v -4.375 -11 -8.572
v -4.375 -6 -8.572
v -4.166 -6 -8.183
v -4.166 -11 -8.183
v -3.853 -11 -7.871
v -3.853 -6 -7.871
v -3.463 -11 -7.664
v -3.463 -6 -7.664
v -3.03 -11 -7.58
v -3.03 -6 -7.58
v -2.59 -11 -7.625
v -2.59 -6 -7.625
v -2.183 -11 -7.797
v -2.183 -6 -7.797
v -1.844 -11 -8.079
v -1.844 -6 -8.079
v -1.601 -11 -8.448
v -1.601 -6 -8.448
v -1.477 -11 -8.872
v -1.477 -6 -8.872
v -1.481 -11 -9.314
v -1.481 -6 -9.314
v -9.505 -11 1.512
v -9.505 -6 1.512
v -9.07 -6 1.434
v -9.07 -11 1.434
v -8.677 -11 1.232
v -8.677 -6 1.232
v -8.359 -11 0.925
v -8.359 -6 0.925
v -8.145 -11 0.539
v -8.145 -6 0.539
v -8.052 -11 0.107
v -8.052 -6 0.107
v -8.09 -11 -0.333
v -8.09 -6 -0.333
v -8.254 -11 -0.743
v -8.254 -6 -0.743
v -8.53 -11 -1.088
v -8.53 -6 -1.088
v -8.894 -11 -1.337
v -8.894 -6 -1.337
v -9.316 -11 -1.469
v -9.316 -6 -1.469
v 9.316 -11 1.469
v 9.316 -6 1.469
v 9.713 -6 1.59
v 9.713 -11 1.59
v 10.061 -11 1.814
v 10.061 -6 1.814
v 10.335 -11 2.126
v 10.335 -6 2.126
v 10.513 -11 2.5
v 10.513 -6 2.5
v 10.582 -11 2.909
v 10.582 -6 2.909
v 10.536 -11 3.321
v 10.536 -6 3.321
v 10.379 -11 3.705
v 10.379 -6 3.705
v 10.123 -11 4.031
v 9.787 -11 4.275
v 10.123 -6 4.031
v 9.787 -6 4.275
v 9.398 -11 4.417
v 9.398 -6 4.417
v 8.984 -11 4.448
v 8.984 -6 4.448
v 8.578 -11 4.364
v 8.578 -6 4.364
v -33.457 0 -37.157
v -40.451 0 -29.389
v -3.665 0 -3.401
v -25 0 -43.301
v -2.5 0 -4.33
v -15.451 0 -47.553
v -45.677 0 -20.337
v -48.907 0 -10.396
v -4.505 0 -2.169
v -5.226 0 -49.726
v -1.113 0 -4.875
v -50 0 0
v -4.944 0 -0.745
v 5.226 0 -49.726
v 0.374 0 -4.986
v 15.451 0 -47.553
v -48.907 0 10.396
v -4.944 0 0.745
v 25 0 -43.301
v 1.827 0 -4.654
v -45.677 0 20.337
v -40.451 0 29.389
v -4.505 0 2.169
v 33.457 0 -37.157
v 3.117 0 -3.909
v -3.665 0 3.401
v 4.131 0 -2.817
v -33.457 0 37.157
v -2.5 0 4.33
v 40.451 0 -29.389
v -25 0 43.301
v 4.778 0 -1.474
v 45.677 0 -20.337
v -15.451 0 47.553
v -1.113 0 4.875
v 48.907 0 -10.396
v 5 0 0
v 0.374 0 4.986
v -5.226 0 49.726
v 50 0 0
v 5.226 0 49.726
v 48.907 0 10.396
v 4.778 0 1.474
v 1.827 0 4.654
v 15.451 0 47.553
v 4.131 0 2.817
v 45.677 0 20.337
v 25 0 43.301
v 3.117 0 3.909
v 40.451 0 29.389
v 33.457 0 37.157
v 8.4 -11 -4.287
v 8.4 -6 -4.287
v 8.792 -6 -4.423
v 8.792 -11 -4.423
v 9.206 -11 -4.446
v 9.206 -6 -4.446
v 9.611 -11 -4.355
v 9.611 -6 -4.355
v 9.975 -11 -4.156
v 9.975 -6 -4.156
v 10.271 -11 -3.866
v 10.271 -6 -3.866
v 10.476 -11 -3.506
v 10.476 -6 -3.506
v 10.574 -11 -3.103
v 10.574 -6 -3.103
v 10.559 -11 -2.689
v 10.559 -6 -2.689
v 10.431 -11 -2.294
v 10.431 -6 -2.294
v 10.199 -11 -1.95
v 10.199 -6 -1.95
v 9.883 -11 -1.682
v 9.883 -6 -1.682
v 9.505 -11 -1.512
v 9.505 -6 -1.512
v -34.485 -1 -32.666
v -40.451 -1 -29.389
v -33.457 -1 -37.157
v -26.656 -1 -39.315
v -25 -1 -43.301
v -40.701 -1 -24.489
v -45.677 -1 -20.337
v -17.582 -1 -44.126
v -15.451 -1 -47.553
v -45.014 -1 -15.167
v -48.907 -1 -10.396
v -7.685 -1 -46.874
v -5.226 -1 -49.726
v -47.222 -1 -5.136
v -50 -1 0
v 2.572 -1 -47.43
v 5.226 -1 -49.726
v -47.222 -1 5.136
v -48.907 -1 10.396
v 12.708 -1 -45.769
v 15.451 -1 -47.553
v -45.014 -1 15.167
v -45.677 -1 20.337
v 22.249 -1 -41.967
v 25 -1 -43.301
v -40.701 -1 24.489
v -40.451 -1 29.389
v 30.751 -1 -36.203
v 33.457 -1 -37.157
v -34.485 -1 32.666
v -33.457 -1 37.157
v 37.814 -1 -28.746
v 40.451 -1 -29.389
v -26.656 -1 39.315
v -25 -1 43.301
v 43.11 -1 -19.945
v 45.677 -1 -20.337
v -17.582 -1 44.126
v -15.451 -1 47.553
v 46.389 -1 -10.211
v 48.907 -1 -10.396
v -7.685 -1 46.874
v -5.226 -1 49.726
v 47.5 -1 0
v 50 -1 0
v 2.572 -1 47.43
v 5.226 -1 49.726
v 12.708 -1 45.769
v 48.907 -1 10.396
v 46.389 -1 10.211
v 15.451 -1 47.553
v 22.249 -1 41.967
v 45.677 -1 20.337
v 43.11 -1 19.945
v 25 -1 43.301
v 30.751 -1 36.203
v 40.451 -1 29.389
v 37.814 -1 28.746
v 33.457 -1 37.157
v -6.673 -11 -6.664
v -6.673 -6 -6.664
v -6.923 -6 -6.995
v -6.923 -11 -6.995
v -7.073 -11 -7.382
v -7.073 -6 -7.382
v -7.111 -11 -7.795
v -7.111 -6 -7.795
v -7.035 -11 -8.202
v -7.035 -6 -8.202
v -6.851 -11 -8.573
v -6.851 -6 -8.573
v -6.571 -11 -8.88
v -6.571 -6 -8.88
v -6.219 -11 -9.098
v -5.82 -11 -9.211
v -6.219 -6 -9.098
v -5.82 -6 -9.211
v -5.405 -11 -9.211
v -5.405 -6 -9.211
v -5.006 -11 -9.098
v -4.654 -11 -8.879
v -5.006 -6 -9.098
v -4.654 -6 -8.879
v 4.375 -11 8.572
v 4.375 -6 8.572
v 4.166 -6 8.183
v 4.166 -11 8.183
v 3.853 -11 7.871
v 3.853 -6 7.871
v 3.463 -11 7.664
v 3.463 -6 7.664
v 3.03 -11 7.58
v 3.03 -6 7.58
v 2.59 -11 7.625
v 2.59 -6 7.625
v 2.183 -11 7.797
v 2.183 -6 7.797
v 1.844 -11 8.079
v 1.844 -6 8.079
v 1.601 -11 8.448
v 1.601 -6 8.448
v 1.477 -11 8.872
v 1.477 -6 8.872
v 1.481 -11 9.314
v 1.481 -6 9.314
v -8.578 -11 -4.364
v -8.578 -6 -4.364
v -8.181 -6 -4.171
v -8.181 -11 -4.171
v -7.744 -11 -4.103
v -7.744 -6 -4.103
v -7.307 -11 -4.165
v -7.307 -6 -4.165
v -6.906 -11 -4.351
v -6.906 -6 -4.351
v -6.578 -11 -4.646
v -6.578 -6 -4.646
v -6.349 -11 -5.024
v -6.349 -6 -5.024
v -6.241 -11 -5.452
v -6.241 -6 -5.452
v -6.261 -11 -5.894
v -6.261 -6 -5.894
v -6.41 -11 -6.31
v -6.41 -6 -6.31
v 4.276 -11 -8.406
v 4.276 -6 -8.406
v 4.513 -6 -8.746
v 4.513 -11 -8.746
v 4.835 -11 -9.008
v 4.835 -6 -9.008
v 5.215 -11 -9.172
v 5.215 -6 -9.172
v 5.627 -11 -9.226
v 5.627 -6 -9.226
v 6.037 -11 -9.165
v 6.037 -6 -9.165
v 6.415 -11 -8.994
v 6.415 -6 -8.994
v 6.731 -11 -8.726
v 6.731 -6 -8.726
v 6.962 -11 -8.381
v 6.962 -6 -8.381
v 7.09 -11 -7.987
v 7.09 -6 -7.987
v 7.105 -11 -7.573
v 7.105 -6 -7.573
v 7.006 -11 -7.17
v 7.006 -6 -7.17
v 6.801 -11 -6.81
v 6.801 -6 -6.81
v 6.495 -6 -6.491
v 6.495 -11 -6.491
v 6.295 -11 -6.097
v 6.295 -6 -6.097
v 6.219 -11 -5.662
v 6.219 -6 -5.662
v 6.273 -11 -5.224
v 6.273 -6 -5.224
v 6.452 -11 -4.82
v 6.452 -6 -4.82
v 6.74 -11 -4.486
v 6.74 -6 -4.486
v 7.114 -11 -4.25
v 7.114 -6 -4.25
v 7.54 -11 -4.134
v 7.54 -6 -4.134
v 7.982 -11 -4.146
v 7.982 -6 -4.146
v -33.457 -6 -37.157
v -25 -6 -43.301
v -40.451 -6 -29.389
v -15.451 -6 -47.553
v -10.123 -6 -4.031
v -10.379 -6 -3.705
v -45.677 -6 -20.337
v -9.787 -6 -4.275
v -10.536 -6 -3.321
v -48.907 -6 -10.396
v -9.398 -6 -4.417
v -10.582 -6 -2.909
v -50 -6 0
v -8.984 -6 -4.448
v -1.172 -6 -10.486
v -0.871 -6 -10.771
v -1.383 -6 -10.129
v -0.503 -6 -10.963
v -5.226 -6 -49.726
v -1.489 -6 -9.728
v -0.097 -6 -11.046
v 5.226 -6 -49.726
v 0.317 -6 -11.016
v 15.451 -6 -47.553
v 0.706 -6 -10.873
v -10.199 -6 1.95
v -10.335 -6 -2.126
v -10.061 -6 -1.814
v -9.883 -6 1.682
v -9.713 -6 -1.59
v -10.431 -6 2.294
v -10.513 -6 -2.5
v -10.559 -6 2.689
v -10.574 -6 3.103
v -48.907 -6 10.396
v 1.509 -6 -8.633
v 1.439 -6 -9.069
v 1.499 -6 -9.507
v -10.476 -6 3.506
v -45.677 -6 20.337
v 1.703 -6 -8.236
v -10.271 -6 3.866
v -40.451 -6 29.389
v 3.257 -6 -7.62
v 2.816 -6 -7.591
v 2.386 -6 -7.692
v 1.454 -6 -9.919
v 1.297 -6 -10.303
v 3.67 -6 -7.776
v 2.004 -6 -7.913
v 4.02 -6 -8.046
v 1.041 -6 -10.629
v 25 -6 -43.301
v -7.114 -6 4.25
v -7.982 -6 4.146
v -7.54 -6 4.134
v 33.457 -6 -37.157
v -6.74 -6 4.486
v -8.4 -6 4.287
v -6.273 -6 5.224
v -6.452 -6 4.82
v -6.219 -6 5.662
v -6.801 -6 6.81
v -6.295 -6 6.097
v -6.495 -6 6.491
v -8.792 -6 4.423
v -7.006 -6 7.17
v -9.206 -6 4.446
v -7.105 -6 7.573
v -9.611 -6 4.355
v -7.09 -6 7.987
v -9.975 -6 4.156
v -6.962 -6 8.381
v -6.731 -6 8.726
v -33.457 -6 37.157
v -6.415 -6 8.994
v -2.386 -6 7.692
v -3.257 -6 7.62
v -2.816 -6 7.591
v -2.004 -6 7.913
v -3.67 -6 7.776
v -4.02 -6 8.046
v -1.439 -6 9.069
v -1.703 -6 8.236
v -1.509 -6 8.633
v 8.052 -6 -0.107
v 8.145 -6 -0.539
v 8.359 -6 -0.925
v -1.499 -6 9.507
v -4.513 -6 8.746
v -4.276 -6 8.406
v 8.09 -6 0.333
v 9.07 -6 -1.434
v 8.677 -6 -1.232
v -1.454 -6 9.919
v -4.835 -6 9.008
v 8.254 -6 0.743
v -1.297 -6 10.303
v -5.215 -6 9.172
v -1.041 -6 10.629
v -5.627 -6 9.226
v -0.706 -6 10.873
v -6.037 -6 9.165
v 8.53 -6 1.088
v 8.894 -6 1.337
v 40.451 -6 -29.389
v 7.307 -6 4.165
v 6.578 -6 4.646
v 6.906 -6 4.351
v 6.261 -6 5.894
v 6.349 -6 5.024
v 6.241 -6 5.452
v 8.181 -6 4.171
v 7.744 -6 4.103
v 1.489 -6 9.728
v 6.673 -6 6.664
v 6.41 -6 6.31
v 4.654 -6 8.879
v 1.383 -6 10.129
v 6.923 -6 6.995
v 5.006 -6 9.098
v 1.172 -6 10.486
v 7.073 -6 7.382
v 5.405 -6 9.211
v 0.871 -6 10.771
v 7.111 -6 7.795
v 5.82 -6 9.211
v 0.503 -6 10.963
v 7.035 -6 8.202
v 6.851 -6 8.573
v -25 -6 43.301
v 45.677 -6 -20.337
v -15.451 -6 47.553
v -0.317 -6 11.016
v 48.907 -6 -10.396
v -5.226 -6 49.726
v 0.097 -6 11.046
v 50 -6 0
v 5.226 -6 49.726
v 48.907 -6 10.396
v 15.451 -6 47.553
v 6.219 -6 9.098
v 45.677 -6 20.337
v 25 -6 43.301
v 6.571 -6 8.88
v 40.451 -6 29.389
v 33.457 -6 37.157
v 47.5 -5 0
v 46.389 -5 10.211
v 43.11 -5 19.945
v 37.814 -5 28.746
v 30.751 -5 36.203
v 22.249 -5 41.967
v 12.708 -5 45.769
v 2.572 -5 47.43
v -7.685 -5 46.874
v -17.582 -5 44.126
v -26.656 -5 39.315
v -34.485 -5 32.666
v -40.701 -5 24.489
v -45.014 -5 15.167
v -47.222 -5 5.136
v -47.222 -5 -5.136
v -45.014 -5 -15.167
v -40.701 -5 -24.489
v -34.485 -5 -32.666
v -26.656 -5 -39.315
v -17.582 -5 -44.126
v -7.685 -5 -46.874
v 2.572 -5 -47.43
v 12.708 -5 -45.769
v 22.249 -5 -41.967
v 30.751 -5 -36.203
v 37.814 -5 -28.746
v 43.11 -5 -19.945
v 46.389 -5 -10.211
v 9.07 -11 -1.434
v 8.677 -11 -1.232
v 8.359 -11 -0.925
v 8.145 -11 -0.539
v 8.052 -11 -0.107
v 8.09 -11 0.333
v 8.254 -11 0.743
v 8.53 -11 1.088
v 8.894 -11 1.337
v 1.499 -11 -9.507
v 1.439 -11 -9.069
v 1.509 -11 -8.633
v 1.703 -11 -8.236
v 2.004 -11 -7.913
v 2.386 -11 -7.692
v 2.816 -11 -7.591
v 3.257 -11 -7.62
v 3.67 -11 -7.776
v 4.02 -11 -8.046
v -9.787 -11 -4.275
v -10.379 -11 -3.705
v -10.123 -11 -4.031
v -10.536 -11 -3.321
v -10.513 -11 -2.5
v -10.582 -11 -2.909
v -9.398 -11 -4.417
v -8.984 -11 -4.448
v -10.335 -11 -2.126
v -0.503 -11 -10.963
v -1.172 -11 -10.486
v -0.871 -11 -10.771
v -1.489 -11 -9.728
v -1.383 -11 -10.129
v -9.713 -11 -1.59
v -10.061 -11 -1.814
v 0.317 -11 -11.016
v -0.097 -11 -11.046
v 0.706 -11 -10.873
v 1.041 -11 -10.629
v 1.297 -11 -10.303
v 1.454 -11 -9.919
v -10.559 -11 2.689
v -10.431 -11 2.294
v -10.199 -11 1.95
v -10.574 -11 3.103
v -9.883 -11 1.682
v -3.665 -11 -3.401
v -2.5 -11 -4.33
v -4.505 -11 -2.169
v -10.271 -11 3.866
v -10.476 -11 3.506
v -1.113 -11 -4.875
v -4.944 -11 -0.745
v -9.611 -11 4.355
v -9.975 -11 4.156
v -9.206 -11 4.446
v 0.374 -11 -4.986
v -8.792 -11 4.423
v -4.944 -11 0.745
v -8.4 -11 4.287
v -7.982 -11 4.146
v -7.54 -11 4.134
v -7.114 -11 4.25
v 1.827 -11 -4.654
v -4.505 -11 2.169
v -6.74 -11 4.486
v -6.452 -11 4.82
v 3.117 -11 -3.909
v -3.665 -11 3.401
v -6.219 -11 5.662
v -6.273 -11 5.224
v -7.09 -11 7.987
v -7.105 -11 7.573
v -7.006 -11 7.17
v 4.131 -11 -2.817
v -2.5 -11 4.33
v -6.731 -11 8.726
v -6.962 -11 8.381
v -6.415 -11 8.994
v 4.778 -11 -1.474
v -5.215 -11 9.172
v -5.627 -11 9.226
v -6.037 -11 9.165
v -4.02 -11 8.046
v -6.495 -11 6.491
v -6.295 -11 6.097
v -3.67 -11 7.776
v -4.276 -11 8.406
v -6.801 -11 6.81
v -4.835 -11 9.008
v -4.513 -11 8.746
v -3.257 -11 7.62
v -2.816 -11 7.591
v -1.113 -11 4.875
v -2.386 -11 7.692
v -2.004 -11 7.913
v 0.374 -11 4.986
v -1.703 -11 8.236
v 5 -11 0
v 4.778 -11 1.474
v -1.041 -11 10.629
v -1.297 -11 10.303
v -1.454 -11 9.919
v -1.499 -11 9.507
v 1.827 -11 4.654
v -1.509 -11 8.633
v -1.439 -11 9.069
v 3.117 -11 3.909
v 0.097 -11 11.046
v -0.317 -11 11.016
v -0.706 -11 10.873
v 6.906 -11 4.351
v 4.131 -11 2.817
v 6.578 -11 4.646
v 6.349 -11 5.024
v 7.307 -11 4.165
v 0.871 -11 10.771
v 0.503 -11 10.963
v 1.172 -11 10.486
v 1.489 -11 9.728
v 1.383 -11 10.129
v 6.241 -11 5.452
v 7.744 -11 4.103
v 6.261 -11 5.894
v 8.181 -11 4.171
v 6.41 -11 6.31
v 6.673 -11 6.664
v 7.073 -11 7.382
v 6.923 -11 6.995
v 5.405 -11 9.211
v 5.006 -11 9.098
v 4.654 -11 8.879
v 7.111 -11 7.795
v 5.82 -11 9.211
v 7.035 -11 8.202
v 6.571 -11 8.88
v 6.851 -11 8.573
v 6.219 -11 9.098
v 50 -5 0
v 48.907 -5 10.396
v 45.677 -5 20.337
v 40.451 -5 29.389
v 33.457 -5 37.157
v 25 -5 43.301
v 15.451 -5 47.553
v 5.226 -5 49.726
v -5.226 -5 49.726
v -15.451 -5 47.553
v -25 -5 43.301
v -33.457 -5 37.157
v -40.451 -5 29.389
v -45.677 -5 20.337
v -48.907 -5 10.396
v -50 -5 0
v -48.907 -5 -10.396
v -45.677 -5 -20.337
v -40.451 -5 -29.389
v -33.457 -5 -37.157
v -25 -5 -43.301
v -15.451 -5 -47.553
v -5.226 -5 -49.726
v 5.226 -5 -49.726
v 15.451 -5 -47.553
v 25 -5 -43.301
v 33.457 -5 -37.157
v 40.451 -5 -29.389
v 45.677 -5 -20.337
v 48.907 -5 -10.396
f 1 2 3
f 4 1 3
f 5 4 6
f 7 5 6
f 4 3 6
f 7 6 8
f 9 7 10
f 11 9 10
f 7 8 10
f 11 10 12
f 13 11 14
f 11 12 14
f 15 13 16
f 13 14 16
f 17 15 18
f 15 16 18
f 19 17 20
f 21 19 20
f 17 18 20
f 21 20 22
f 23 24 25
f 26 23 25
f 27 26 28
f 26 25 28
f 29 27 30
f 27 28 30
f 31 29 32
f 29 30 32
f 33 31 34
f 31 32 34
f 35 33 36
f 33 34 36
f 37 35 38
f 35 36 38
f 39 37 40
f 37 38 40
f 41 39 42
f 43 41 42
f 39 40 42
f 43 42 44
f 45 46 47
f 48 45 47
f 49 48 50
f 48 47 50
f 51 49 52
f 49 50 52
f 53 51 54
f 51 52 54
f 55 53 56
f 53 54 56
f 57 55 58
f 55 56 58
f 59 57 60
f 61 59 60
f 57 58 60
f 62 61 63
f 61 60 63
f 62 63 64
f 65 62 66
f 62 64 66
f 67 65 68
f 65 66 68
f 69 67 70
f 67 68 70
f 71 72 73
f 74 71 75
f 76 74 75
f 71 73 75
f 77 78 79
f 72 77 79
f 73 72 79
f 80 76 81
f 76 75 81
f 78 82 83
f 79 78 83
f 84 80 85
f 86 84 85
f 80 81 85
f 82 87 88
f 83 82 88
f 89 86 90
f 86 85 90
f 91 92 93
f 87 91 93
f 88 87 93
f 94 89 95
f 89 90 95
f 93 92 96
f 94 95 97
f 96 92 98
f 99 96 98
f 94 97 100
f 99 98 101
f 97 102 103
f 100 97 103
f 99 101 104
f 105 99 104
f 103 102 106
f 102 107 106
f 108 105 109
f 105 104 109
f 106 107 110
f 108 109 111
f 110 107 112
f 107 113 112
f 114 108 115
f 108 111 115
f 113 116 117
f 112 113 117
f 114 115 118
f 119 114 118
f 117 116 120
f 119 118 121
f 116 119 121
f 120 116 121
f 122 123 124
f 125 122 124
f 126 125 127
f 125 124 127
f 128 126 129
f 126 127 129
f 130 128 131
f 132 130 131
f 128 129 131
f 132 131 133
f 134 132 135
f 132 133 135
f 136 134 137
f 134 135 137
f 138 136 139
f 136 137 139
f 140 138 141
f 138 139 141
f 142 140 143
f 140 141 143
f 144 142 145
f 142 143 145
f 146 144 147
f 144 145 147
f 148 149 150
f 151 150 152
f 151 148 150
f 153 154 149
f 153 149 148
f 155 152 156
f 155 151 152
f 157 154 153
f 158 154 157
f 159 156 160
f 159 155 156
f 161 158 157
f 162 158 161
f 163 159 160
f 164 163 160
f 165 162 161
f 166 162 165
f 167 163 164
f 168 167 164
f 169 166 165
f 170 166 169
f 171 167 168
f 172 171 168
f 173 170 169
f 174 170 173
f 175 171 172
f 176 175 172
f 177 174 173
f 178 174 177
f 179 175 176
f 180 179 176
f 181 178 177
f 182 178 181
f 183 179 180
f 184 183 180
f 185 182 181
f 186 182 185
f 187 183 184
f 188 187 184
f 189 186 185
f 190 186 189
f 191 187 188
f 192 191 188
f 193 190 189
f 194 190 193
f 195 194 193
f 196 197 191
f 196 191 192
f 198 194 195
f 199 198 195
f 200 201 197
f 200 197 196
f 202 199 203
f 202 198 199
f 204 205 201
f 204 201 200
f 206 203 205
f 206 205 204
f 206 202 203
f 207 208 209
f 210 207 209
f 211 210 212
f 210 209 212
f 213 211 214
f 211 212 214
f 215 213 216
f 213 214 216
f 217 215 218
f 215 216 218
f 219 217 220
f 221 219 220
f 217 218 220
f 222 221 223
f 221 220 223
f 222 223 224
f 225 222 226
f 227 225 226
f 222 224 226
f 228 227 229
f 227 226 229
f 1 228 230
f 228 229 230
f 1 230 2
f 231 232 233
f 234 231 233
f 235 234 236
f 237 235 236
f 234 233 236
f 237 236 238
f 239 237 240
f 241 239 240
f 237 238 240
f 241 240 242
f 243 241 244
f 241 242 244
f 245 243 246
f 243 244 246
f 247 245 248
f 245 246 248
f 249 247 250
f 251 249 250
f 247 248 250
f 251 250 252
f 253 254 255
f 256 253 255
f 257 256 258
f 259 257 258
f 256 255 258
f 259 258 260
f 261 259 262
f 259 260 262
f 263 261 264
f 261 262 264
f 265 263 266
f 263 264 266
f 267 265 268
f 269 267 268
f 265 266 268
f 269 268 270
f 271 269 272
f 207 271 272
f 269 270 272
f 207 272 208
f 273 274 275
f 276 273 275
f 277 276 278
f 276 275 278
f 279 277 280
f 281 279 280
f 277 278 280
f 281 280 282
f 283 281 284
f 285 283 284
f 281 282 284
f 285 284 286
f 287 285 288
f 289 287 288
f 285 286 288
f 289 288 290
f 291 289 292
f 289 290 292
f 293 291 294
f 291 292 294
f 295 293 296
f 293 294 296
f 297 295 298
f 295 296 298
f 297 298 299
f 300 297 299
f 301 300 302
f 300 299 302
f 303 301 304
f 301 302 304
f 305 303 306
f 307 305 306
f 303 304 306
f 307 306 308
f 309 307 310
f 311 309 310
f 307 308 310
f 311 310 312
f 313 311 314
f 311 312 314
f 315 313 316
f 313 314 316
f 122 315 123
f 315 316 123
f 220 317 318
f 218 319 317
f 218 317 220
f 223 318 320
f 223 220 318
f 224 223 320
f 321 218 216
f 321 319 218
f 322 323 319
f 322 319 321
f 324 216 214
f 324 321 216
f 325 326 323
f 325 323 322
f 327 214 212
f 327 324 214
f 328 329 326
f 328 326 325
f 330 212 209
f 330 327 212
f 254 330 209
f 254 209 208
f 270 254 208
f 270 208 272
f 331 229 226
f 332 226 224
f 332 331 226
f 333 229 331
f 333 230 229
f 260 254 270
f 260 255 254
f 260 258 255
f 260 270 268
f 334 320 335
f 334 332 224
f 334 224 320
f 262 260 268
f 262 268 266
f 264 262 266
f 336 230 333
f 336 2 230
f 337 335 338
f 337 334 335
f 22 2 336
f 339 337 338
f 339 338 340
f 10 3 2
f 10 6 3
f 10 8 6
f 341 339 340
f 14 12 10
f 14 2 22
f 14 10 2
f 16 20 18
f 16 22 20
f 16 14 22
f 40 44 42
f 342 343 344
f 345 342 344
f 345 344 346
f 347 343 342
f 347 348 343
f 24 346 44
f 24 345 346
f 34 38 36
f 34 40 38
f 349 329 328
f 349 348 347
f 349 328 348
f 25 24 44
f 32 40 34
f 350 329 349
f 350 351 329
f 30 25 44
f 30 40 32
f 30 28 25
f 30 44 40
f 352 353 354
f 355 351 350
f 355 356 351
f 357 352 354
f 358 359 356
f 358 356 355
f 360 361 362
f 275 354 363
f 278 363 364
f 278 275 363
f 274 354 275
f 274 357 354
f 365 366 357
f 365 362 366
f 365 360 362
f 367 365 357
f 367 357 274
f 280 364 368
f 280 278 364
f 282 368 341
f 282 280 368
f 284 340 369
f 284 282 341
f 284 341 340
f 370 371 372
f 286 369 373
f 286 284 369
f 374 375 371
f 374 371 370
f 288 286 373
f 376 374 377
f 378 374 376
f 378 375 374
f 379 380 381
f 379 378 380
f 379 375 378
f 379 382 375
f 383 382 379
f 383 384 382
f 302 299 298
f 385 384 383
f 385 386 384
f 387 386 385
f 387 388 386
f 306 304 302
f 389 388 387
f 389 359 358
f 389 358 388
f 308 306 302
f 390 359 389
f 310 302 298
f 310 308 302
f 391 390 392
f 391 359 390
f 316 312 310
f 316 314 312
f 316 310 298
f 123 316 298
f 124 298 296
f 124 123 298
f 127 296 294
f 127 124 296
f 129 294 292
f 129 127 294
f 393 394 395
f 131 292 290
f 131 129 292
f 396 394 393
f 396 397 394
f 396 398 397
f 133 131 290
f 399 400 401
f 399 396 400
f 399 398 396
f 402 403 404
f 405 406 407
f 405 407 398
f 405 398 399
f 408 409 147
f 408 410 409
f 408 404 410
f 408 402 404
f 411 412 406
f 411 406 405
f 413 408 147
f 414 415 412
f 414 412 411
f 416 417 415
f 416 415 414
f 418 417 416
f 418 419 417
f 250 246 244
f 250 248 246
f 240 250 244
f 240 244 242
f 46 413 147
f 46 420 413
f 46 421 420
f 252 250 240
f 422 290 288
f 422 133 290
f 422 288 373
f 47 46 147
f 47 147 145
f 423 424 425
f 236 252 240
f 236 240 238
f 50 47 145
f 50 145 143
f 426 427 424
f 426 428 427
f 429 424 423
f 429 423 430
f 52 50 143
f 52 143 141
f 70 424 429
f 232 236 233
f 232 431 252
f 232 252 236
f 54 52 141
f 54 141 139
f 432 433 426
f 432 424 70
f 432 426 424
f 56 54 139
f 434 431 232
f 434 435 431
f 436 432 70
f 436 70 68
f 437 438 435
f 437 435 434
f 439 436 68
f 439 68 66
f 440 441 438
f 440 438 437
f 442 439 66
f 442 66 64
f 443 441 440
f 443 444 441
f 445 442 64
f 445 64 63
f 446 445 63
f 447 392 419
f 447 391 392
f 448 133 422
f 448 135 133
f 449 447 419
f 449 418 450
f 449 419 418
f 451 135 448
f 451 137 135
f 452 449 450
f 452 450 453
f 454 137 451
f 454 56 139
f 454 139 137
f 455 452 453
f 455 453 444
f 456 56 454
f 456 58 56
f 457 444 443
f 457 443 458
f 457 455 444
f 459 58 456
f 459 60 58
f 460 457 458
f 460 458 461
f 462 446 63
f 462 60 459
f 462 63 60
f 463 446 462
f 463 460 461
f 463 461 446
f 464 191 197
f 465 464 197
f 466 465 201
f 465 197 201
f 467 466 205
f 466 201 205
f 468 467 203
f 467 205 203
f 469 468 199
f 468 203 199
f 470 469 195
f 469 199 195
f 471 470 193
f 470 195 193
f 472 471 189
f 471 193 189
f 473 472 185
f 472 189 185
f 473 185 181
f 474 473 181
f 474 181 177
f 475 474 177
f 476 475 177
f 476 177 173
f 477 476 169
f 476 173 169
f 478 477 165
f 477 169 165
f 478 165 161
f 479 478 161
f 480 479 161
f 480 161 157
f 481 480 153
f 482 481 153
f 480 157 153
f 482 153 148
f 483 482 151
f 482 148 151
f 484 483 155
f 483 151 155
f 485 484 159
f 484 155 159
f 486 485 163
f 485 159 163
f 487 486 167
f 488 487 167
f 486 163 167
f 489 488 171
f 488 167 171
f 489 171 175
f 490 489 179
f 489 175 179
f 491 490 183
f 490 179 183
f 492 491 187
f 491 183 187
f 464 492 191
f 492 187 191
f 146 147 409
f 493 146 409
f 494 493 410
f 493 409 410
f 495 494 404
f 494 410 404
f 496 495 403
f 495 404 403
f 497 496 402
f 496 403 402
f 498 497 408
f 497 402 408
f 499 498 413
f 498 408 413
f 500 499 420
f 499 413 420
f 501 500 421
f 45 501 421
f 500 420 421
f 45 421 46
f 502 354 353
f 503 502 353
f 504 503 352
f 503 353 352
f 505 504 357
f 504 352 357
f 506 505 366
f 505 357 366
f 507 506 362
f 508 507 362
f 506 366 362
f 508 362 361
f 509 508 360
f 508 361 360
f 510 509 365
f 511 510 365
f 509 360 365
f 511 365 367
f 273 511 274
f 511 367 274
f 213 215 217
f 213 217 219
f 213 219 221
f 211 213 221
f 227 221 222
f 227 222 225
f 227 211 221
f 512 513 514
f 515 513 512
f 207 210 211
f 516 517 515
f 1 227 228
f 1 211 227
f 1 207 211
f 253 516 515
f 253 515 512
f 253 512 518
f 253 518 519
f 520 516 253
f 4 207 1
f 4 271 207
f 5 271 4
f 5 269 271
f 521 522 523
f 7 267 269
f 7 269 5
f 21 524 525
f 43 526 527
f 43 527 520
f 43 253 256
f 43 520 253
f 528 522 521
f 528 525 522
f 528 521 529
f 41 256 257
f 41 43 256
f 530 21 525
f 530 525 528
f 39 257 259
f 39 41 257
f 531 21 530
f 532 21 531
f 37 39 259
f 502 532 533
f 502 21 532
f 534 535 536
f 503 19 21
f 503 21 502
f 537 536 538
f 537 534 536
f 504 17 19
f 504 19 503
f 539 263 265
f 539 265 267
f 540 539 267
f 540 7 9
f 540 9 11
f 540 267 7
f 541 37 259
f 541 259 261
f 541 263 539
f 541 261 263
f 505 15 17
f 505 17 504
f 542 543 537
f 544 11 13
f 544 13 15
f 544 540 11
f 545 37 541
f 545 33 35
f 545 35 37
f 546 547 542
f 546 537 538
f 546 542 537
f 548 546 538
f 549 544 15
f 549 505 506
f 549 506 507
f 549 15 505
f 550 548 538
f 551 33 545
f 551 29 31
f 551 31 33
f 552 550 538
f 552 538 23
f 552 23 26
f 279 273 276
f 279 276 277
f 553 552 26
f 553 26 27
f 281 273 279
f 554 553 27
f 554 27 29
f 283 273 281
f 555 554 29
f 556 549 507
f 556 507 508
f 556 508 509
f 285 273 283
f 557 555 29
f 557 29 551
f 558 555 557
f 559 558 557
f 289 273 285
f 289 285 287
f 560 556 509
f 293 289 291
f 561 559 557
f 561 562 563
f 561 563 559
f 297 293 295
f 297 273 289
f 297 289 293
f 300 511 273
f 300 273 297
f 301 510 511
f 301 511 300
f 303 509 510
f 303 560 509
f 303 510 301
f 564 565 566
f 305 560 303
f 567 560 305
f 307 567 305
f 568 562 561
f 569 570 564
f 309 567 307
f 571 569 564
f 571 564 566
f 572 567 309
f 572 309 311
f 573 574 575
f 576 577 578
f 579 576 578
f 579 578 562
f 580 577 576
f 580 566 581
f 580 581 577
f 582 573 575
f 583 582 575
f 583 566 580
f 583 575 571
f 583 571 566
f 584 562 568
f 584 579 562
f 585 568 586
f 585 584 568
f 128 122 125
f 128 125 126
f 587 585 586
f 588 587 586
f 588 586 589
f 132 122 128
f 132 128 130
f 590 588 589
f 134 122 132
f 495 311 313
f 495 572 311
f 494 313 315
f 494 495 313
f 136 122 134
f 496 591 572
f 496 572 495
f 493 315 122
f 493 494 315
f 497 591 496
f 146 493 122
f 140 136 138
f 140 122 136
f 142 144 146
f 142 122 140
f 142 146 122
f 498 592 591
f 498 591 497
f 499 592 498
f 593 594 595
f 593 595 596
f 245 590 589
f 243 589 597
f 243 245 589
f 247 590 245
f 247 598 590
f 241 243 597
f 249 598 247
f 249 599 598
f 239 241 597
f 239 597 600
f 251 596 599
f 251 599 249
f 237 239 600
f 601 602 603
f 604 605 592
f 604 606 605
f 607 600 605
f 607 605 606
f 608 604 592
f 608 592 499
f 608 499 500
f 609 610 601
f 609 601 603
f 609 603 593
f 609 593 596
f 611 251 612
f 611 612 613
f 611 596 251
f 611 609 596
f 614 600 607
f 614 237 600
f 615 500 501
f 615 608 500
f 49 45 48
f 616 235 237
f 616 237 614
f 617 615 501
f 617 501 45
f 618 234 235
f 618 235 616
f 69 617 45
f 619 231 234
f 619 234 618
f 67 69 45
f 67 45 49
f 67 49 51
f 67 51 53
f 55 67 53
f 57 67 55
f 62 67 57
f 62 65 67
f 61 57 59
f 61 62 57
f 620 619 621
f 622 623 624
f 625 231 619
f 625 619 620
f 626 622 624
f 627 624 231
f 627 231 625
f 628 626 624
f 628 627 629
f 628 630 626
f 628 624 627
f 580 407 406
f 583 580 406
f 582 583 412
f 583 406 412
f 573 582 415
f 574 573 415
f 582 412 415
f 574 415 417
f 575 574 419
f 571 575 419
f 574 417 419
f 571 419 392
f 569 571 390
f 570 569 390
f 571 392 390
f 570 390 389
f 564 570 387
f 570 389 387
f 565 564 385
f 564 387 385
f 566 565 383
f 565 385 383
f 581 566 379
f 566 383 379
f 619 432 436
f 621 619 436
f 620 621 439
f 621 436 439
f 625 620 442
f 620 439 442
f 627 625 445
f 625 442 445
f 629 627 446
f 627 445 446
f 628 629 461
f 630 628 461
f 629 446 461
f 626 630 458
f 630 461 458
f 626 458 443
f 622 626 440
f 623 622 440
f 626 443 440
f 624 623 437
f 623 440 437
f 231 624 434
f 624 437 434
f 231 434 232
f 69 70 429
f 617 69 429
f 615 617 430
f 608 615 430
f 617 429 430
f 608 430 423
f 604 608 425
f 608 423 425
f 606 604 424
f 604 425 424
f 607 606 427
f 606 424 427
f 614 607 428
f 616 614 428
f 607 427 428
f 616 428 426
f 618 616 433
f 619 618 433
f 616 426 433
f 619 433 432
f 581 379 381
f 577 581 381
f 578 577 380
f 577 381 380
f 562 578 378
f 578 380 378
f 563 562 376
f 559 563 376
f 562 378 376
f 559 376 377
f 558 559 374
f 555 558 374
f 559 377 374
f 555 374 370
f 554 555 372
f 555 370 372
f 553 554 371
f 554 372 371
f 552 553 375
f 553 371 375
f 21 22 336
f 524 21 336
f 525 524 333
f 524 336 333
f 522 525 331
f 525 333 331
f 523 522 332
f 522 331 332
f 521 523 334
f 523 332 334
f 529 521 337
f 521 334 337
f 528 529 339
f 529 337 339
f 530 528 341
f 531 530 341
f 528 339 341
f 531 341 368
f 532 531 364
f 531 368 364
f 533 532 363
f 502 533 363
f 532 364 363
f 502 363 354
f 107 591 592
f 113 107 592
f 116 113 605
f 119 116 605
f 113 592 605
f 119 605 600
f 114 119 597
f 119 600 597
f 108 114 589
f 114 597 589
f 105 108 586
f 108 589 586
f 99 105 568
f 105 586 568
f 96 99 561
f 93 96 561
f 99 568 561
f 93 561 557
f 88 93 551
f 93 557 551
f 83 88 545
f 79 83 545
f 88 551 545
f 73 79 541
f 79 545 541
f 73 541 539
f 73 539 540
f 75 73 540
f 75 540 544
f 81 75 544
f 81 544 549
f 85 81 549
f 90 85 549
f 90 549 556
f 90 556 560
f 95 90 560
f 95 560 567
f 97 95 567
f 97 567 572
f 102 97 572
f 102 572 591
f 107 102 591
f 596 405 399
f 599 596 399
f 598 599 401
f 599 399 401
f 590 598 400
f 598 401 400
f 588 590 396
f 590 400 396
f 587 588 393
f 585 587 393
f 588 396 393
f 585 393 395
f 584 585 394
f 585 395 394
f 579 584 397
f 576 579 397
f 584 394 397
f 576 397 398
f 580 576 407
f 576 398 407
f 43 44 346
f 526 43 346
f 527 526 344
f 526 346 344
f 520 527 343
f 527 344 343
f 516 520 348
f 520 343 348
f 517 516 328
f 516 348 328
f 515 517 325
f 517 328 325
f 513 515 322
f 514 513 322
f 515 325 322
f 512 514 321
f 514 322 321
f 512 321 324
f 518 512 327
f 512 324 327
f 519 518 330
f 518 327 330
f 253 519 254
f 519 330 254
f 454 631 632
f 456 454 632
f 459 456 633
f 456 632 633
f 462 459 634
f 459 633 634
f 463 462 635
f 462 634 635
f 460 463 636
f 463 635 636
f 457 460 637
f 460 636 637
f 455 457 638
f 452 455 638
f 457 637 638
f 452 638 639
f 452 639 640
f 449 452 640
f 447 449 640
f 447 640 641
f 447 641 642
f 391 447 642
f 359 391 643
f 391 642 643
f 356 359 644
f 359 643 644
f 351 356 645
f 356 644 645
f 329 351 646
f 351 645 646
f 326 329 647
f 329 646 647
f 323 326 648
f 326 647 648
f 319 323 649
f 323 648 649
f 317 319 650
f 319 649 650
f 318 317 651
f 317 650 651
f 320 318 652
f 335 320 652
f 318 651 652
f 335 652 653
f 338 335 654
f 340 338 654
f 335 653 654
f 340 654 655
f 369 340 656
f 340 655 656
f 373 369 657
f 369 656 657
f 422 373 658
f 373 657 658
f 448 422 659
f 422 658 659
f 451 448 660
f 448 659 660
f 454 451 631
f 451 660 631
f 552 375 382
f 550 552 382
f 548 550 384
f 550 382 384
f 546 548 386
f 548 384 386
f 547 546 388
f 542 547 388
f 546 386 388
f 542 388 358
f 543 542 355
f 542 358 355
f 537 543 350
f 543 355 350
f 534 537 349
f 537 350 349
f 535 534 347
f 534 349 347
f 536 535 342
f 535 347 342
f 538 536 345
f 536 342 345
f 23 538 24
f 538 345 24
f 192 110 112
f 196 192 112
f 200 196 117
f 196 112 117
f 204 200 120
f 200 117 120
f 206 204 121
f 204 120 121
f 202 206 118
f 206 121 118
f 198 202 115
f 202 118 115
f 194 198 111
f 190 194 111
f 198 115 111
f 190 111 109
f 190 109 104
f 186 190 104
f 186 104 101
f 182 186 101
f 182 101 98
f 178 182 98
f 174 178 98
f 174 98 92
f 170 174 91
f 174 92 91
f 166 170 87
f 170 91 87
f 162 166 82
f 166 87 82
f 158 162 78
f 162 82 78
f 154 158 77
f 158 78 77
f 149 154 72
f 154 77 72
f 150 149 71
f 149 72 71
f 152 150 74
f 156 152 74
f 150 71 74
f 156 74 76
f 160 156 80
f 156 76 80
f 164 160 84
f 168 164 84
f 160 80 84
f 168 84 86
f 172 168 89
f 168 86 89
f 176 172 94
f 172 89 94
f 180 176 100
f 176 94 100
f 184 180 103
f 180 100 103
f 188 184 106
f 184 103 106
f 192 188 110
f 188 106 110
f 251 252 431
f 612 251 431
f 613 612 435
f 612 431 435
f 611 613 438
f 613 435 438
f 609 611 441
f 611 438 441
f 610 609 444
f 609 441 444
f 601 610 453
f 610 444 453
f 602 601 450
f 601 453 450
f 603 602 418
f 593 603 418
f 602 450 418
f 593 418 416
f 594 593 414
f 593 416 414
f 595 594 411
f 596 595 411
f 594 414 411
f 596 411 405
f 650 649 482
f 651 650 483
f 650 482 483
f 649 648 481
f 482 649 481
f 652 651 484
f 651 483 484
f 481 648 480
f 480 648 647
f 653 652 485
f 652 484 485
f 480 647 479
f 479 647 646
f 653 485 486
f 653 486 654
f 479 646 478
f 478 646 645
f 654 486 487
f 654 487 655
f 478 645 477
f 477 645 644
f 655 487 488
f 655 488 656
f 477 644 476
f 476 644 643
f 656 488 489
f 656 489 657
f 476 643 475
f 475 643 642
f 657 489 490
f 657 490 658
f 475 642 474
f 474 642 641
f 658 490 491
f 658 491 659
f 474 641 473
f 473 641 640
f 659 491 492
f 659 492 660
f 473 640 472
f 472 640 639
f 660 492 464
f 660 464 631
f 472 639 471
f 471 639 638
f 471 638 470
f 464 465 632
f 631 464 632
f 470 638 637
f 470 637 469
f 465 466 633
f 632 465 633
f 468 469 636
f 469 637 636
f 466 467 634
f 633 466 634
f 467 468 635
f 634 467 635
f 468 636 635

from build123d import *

# Parameters (mm, degrees)
F0_R      = 50
F1_DEPTH  = 1
F2_R      = 47.5
F3_DEPTH  = 4
F4_R      = 50
F4_R_2    = 47.5
F5_DEPTH  = 1
F7_DEPTH  = 6
F8_DEPTH  = 1
F9_R      = 5
F10_DEPTH = 25


with BuildPart() as f1:
    # F0 (on Front) → F1 (new body)
    with BuildSketch(Plane.XZ):
        Circle(F0_R)
    extrude(amount=F1_DEPTH)

    # F2 (on face) → F3 (join)
    with BuildSketch(Plane.XZ.offset(1)):
        Circle(F2_R)
    extrude(amount=F3_DEPTH)

    # F4 (on face) → F5 (join)
    with BuildSketch(Plane.XZ.offset(5)):
        Circle(F4_R)
        Circle(F4_R_2, mode=Mode.SUBTRACT)
    extrude(amount=F5_DEPTH)

    # F6 (on face) → F7 (join)
    with BuildSketch(Plane.XZ.offset(5)):
        with BuildLine():
            ThreePointArc((4.3749025625, 8.5724532519), (2.590430401, 7.6252153584), (1.4813797084, 9.3138855699))
            ThreePointArc((1.4813797084, 9.3138855699), (0.0968585728, 11.046369539), (-1.4993910756, 9.5067635707))
            ThreePointArc((-1.4993910756, 9.5067635707), (-2.3862869161, 7.6915455975), (-4.2761032204, 8.4058248554))
            ThreePointArc((-4.2761032204, 8.4058248554), (-6.4145328749, 8.9936327239), (-6.8009682853, 6.8098133285))
            ThreePointArc((-6.8009682853, 6.8098133285), (-6.4515237381, 4.8199668444), (-8.4002600583, 4.2870247495))
            ThreePointArc((-8.4002600583, 4.2870247495), (-10.4757907864, 3.5056338906), (-9.5048067664, 1.5117458519))
            ThreePointArc((-9.5048067664, 1.5117458519), (-8.0524977714, 0.1073245813), (-9.3158030683, -1.4692731))
            ThreePointArc((-9.3158030683, -1.4692731), (-10.5356526766, -3.3213979368), (-8.5781321192, -4.3637571578))
            ThreePointArc((-8.5781321192, -4.3637571578), (-6.5776913503, -4.6463120239), (-6.6730259387, -6.6643585641))
            ThreePointArc((-6.6730259387, -6.6643585641), (-6.5712533379, -8.8797686425), (-4.3749025625, -8.5724532519))
            ThreePointArc((-4.3749025625, -8.5724532519), (-2.590430401, -7.6252153584), (-1.4813797084, -9.3138855699))
            ThreePointArc((-1.4813797084, -9.3138855699), (-0.0968585728, -11.046369539), (1.4993910756, -9.5067635707))
            ThreePointArc((1.4993910756, -9.5067635707), (2.3862869161, -7.6915455975), (4.2761032204, -8.4058248554))
            ThreePointArc((4.2761032204, -8.4058248554), (6.4145328749, -8.9936327239), (6.8009682853, -6.8098133285))
            ThreePointArc((6.8009682853, -6.8098133285), (6.4515237381, -4.8199668444), (8.4002600583, -4.2870247495))
            ThreePointArc((8.4002600583, -4.2870247495), (10.4757907864, -3.5056338906), (9.5048067664, -1.5117458519))
            ThreePointArc((9.5048067664, -1.5117458519), (8.0524977714, -0.1073245813), (9.3158030683, 1.4692731))
            ThreePointArc((9.3158030683, 1.4692731), (10.5356526766, 3.3213979368), (8.5781321192, 4.3637571578))
            ThreePointArc((8.5781321192, 4.3637571578), (6.5776913503, 4.6463120239), (6.6730259387, 6.6643585641))
            ThreePointArc((6.6730259387, 6.6643585641), (6.5712533379, 8.8797686425), (4.3749025625, 8.5724532519))
        make_face()
    extrude(amount=F7_DEPTH)

    # F8 (add): a face of the model
    f8_faces = [f1.faces().sort_by_distance(p)[0] for p in [
        (-46.1564971157, -5, 0),
    ]]
    extrude(f8_faces, amount=F8_DEPTH)

    # F9 (on face) → F10 (cut)
    with BuildSketch(Plane.XZ.offset(11)):
        Circle(F9_R)
    extrude(amount=-F10_DEPTH, mode=Mode.SUBTRACT)


solid = f1.part
